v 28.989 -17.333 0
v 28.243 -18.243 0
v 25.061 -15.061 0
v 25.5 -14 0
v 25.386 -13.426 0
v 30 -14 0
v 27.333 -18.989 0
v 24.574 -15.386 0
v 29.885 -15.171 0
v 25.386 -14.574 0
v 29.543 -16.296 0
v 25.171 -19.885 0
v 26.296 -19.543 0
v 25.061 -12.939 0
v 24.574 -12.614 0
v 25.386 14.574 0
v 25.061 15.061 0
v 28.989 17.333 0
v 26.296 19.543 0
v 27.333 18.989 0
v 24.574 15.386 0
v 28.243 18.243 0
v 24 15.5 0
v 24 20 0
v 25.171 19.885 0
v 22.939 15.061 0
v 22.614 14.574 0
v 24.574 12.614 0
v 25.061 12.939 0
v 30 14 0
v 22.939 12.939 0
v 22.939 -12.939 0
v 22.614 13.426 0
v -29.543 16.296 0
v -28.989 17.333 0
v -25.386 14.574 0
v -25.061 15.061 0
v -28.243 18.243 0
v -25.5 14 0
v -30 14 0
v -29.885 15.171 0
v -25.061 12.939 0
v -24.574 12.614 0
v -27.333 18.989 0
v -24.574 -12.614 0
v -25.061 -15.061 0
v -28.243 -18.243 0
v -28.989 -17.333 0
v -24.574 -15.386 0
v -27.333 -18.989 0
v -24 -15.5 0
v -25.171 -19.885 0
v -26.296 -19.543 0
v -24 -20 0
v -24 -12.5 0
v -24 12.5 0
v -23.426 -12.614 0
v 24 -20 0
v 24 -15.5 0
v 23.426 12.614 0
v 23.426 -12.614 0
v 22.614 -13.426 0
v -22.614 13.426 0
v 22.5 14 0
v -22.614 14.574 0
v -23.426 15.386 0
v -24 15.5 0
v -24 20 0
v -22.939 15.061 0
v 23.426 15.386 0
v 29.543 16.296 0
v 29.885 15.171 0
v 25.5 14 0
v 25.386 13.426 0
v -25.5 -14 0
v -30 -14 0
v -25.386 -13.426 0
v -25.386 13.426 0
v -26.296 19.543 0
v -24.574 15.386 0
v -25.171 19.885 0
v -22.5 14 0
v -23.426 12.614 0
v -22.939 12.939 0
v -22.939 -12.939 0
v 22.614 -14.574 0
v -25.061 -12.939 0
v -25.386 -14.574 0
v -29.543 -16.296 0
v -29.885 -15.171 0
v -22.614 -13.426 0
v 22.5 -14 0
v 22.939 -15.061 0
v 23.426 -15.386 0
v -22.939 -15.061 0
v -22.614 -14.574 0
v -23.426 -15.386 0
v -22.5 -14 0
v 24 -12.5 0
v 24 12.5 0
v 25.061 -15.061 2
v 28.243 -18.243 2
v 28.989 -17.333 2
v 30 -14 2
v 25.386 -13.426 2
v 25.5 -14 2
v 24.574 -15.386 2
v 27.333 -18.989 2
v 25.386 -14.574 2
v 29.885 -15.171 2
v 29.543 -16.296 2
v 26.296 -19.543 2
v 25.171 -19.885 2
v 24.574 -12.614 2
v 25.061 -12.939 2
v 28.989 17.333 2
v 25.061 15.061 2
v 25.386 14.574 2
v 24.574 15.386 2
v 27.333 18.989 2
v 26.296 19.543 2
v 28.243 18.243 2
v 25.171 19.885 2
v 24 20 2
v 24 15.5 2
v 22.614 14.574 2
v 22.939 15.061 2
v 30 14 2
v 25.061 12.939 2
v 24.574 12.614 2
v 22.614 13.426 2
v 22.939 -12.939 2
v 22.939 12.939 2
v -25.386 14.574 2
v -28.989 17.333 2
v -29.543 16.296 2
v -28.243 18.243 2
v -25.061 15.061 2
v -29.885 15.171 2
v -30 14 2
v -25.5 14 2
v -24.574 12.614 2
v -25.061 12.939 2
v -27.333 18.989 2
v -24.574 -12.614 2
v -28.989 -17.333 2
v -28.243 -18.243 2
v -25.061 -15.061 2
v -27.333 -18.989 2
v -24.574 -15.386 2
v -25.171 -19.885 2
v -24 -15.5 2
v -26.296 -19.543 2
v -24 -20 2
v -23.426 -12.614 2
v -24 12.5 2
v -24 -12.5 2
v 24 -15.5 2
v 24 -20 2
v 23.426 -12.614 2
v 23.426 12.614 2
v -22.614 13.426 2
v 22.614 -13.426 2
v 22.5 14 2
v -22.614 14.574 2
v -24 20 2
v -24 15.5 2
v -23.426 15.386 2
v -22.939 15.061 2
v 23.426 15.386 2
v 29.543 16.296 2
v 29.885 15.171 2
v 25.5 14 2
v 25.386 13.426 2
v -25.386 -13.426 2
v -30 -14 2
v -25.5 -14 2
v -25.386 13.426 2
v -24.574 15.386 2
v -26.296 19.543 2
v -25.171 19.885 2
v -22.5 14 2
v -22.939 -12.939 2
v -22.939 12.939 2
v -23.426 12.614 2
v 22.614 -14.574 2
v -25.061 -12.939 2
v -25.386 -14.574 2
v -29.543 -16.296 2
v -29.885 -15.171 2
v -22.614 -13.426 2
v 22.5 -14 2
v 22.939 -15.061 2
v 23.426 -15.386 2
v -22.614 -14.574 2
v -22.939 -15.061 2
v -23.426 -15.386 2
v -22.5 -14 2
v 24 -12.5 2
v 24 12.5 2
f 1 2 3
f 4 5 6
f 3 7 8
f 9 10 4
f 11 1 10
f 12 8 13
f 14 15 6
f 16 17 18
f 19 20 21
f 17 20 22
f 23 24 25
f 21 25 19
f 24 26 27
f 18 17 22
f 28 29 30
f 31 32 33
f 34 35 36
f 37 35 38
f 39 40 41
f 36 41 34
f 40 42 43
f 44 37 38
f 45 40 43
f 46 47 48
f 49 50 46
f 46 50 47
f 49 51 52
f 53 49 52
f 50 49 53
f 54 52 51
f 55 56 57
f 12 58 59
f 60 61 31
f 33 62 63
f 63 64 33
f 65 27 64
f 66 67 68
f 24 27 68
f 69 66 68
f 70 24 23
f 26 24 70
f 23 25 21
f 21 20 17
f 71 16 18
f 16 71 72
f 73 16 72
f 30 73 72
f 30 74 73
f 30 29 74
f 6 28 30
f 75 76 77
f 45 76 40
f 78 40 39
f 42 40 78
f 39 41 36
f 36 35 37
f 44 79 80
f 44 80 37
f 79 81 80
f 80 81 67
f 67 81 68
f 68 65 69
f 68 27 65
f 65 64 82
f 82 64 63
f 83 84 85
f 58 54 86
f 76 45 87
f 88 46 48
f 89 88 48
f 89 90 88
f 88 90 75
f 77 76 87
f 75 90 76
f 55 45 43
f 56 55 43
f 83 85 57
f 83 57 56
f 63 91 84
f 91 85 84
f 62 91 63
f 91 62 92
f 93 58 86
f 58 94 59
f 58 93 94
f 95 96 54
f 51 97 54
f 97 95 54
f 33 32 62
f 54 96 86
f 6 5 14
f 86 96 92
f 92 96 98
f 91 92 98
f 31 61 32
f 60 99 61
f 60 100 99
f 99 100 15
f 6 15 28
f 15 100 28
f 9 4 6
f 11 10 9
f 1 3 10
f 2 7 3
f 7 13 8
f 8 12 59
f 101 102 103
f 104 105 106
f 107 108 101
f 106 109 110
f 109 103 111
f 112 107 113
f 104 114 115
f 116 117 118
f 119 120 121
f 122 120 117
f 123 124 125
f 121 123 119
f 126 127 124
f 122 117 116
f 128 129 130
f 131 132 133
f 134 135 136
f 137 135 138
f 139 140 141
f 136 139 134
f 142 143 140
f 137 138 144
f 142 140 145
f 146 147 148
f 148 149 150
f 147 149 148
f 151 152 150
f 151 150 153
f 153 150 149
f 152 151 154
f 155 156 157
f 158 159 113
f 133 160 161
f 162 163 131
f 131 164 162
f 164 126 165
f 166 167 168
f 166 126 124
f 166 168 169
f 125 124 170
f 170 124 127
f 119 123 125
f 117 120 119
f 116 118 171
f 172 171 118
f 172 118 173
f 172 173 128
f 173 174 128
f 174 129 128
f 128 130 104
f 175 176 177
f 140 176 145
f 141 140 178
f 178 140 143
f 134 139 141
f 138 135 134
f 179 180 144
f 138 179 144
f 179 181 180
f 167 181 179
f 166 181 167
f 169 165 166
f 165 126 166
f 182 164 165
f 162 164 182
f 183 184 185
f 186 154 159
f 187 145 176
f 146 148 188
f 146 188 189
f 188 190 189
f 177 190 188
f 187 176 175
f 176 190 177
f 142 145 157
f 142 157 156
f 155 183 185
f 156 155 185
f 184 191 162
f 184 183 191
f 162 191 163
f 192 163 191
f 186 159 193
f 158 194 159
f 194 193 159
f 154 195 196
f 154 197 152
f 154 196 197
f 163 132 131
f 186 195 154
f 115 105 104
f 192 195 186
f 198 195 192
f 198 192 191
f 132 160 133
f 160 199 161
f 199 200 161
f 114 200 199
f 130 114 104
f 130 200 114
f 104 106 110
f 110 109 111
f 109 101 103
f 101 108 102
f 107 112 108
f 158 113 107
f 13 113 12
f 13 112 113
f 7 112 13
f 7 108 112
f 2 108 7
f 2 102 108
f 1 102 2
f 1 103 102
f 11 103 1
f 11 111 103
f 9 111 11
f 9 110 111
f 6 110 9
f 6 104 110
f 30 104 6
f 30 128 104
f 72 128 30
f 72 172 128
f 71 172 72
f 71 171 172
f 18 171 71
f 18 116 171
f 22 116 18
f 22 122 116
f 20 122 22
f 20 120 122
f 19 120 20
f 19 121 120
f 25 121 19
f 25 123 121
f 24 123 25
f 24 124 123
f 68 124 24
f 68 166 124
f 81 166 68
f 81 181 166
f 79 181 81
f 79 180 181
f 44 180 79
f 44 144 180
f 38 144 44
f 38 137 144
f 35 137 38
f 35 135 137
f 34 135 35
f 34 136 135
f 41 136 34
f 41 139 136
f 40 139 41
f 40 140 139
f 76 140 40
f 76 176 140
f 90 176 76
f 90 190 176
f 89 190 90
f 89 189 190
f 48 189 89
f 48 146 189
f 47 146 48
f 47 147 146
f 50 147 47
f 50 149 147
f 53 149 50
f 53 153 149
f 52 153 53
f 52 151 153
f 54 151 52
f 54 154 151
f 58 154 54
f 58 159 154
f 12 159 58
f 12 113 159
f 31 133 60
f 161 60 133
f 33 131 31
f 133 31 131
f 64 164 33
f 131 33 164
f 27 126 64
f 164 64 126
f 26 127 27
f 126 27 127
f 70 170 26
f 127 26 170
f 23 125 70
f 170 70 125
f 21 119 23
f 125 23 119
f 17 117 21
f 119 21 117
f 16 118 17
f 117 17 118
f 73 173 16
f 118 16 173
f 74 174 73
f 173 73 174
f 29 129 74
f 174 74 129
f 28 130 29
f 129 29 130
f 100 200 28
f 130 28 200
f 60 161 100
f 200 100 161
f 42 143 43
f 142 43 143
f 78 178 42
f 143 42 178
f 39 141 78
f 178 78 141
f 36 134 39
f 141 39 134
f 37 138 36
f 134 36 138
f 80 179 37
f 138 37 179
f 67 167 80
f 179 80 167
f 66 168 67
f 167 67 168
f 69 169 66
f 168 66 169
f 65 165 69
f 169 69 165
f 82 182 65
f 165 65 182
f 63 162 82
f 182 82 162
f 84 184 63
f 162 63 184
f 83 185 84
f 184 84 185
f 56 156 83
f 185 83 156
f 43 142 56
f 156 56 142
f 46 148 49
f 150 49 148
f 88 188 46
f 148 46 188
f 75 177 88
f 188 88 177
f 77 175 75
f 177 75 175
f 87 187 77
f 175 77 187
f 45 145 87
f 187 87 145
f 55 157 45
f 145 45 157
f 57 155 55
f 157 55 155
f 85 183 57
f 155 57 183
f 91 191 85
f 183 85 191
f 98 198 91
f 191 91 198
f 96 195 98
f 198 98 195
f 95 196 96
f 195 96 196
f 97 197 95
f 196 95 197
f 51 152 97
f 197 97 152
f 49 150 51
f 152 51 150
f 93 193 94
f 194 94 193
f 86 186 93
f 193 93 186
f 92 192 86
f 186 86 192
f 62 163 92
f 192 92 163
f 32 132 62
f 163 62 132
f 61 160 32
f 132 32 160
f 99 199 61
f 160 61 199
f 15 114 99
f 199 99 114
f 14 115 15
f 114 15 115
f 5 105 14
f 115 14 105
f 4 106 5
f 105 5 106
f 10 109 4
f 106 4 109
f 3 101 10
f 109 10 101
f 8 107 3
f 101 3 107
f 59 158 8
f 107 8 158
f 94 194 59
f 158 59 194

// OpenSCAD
// file: ../A2D.scad
/****************************************************************************
 * Altair's 2D Objects for OpenSCAD              version 1.0.0 (2020-02-20) *
 * Copyright (c) Michal A. Valasek, 2020                                    *
 * ------------------------------------------------------------------------ *
 * www.rider.cz * www.altair.blog * github.com/ridercz/A2D                  *
 ****************************************************************************/

// Constants
a2d_version = [1, 0, 0];    // Version of a2d library [major, minor, revision]
pi = PI;                    // Pi value
phi = (1 + sqrt(5)) / 2;    // Golden ratio

/** POINT GENERATORS **/

// Generates points of vertices of regular polygon, given outer diameter and number of vertices, centered on origin
function regpoly_points(od, vertices) =
    assert(od > 0)
    assert(vertices > 1)
    [for(a = [0 : 360 / vertices : 359]) vector_point(a+90, od / 2)];

// Generates points of vertices of a rectangle ("square" in OpenSCAD terminology), given its size in [x, y]
function square_points(size, center = false) = 
    assert(is_list(size) && len(size) == 2)
    center 
        ? translate_points(square_points(size, false), size / -2)
        : [[0, 0], [size[0], 0], size, [0, size[1]]];

// Generates points of vertices of a star, given number of star points, outer diameter and inner diameter, centered on origin
function star_points(n, od, id) = 
    assert(n > 2)
    assert(od > id)
    assert(id > 0)
    [for(a = [0 : 360 / n : 359]) each([vector_point(a, od / 2), vector_point(a + 180 / n, id / 2)])];

/** SHAPES - STARS **/

// Creates a perfect five-pointed star of given outer diameter, centered on origin
module p5star(od) {
    assert(od > 0);

    id = od * (2 - phi);
    star(5, od,  id);
}

// Creates a perfect six-pointed star of given outer diameter, centered on origin
module p6star(od) {
    assert(od > 0);

    rotate(30) circle(d = od, $fn = 3);
    rotate(90) circle(d = od, $fn = 3);
}

// Creates a regular star of given number of points and outer and inner diameter, centered on origin
module star(n, od, id) {
    assert(n > 2);
    assert(od > id);
    assert(id > 0);

    polygon(star_points(n, od, id));
}

/** SHAPES - ROUNDED **/

// Creates a regular polygon with given outer diameter, number of vertices and vertex radius, centered on origin
module r_regpoly(od, vertices, radius) {
    // Validate arguments
    assert(od > 0);
    assert(vertices > 1);
    assert(radius >= 0);
    
    if(radius == 0) {
        circle(d = od, $fn = vertices);
    } else {
        hull() for(pos = regpoly_points(od - 2 * radius, vertices) ) translate(pos) circle(r = radius);
    }
}

// Creates a rectangle with given size and corner radius. Size may be specified:
// - as a scalar number, the same for all corners
// - as a list with two items, for top and bottom radii
// - as a list with four items, for all corners, starting with left bottom counterclockwise
module r_square(size, radius, center = false) {
    // Validate arguments
    assert(is_list(size) && len(size) == 2);
    assert(is_num(radius) || (is_list(radius) && len(radius) == 2) || len(radius) == 4);

    if(is_num(radius)) {
        // The same radius on all corners
        r_square(size, [radius, radius, radius, radius], center);
    } else if(len(radius) == 2) {
        // Different radii on top and bottom
        r_square(size, [radius[0], radius[0], radius[1], radius[1]], center);
    } else if(len(radius) == 4) {
        // Different radius on different corners
        translate(center ? [size[0] / -2, size[1] / -2] : [0, 0]) hull() {
            // BL
            if(radius[0] <= 0) square([1, 1]);
            else translate([radius[0], radius[0]]) circle(r = radius[0]);
            // BR
            if(radius[1] <= 0) translate([size[0] - 1, 0]) square([1, 1]);
            else translate([size[0] - radius[1], radius[1]]) circle(r = radius[1]);
            // TR
            if(radius[2] <= 0) translate([size[0] - 1, size[1] - 1]) square([1, 1]);
            else translate([size[0] - radius[2], size[1] - radius[2]]) circle(r = radius[2]);
            // TL
            if(radius[3] <= 0) translate([0, size[1] - 1]) square([1, 1]);
            else translate([radius[3], size[1] - radius[3]]) circle(r = radius[3]);
        }
    } else {
        // This code should be unreachable
        assert(false);
    }
}

/** SHAPES - HOLLOW **/

// Hollow circle (ring) with given wall thickness; use $fn to create hollow regular polygon
module h_circle(d, thickness) {
    assert(d > 0);
    assert(thickness != 0);

    difference() {
        circle(d = a2d_outer(d, thickness));
        circle(d = a2d_inner(d, thickness));
    }
}

// Hollow rectangle ("square" in OpenSCAD terminology) with given wall thickness
module h_square(size, thickness, center = false) {
    assert(thickness != 0);

    translate(center ? [0, 0] : [a2d_outer(size[0], thickness) / 2, a2d_outer(size[1], thickness) / 2])
        difference() {
            square([a2d_outer(size[0], thickness), a2d_outer(size[1], thickness)], center = true);
            square([a2d_inner(size[0], thickness), a2d_inner(size[1], thickness)], center = true);
        }
}

/** SHAPES - HOLLOW AND ROUNDED **/

// Hollow and rounded regular polygon
module hr_regpoly(od, vertices, radius, thickness) {
    rh_regpoly(od, vertices, radius, thickness);
}
module rh_regpoly(od, vertices, radius, thickness) {
    assert(od > 0);
    assert(vertices > 1);
    assert(radius >= 0);
    assert(thickness != 0);

    difference() {
        r_regpoly(a2d_outer(od, thickness), vertices, a2d_outer(radius, thickness, 1));
        r_regpoly(a2d_inner(od, thickness), vertices, a2d_inner(radius, thickness, 1));
    }
}

// Hollow and rounded rectangle ("square" in OpenSCAD terminology)
module hr_square(size, radius, thickness, center = false) {
    rh_square(size, radius, thickness, center);
}
module rh_square(size, radius, thickness, center = false) {
    // Validate arguments
    assert(is_list(size) && len(size) == 2);
    assert(is_num(radius) || (is_list(radius) && len(radius) == 2) || len(radius) == 4);
    assert(thickness != 0);

    translate(center ? [0, 0] : [a2d_outer(size[0], thickness) / 2, a2d_outer(size[1], thickness) / 2])
        difference() {
            r_square([a2d_outer(size[0], thickness), a2d_outer(size[1], thickness)], a2d_outer(radius, thickness, factor = 1), center = true);
            r_square([a2d_inner(size[0], thickness), a2d_inner(size[1], thickness)], a2d_inner(radius, thickness, factor = 1), center = true);
        }
}

/** FUNCTIONS **/

// Gets ciscumscribed circle diameter from given inscribed circle diameter for a regular polygon
function ins2cir(ri, n) = 
    assert(ri > 0)
    assert(n > 2)
    ri * tan(180 / n) / sin(180 / n);

// Gets inscribed circle diameter from given curcumscribed circle diameter for a regular polygon
function cir2ins(rc, n) =
    assert(rc > 0)
    assert(n > 0)
    rc * sin(180 / n) / tan(180 / n);

// Returns point (coordinates) for a given angle (alpha) and distance); follows left hand rule
function vector_point(alpha, delta) = [sin(alpha) * delta, cos(alpha) * delta];

// Will offset a list of points by given offset each
function translate_points(points, offset) = [for(p = points) p + offset];

// Private helper functions

function a2d_outer(d, thickness, factor = 2) = 
    assert(thickness != 0) 
    assert(factor > 0)
    is_list(d) 
        ? [for(x = d) a2d_outer(x, thickness, factor)] 
        : (thickness > 0 ? d + factor * thickness : d);

function a2d_inner(d, thickness, factor = 2) = 
    assert(thickness != 0)
    assert(factor > 0)
    is_list(d) 
        ? [for(x = d) a2d_inner(x, thickness, factor)] 
        : (thickness > 0 ? d : d + factor * thickness);
// main file
// Simple lid with a corner holes

include <../A2D.scad>

size = [60, 40];
corner_radius = 6;
hole_diameter = 3;
height = 2;

linear_extrude(height) difference() {
    // Main shape
    r_square(size, corner_radius, center = true, $fn = 32);

    // Corner holes
    hole_pos = square_points([size[0] - 2 * corner_radius, size[1] - 2 * corner_radius], center = true);
    for(pos = hole_pos) translate(pos) circle(d = hole_diameter, $fn = 16);
}
